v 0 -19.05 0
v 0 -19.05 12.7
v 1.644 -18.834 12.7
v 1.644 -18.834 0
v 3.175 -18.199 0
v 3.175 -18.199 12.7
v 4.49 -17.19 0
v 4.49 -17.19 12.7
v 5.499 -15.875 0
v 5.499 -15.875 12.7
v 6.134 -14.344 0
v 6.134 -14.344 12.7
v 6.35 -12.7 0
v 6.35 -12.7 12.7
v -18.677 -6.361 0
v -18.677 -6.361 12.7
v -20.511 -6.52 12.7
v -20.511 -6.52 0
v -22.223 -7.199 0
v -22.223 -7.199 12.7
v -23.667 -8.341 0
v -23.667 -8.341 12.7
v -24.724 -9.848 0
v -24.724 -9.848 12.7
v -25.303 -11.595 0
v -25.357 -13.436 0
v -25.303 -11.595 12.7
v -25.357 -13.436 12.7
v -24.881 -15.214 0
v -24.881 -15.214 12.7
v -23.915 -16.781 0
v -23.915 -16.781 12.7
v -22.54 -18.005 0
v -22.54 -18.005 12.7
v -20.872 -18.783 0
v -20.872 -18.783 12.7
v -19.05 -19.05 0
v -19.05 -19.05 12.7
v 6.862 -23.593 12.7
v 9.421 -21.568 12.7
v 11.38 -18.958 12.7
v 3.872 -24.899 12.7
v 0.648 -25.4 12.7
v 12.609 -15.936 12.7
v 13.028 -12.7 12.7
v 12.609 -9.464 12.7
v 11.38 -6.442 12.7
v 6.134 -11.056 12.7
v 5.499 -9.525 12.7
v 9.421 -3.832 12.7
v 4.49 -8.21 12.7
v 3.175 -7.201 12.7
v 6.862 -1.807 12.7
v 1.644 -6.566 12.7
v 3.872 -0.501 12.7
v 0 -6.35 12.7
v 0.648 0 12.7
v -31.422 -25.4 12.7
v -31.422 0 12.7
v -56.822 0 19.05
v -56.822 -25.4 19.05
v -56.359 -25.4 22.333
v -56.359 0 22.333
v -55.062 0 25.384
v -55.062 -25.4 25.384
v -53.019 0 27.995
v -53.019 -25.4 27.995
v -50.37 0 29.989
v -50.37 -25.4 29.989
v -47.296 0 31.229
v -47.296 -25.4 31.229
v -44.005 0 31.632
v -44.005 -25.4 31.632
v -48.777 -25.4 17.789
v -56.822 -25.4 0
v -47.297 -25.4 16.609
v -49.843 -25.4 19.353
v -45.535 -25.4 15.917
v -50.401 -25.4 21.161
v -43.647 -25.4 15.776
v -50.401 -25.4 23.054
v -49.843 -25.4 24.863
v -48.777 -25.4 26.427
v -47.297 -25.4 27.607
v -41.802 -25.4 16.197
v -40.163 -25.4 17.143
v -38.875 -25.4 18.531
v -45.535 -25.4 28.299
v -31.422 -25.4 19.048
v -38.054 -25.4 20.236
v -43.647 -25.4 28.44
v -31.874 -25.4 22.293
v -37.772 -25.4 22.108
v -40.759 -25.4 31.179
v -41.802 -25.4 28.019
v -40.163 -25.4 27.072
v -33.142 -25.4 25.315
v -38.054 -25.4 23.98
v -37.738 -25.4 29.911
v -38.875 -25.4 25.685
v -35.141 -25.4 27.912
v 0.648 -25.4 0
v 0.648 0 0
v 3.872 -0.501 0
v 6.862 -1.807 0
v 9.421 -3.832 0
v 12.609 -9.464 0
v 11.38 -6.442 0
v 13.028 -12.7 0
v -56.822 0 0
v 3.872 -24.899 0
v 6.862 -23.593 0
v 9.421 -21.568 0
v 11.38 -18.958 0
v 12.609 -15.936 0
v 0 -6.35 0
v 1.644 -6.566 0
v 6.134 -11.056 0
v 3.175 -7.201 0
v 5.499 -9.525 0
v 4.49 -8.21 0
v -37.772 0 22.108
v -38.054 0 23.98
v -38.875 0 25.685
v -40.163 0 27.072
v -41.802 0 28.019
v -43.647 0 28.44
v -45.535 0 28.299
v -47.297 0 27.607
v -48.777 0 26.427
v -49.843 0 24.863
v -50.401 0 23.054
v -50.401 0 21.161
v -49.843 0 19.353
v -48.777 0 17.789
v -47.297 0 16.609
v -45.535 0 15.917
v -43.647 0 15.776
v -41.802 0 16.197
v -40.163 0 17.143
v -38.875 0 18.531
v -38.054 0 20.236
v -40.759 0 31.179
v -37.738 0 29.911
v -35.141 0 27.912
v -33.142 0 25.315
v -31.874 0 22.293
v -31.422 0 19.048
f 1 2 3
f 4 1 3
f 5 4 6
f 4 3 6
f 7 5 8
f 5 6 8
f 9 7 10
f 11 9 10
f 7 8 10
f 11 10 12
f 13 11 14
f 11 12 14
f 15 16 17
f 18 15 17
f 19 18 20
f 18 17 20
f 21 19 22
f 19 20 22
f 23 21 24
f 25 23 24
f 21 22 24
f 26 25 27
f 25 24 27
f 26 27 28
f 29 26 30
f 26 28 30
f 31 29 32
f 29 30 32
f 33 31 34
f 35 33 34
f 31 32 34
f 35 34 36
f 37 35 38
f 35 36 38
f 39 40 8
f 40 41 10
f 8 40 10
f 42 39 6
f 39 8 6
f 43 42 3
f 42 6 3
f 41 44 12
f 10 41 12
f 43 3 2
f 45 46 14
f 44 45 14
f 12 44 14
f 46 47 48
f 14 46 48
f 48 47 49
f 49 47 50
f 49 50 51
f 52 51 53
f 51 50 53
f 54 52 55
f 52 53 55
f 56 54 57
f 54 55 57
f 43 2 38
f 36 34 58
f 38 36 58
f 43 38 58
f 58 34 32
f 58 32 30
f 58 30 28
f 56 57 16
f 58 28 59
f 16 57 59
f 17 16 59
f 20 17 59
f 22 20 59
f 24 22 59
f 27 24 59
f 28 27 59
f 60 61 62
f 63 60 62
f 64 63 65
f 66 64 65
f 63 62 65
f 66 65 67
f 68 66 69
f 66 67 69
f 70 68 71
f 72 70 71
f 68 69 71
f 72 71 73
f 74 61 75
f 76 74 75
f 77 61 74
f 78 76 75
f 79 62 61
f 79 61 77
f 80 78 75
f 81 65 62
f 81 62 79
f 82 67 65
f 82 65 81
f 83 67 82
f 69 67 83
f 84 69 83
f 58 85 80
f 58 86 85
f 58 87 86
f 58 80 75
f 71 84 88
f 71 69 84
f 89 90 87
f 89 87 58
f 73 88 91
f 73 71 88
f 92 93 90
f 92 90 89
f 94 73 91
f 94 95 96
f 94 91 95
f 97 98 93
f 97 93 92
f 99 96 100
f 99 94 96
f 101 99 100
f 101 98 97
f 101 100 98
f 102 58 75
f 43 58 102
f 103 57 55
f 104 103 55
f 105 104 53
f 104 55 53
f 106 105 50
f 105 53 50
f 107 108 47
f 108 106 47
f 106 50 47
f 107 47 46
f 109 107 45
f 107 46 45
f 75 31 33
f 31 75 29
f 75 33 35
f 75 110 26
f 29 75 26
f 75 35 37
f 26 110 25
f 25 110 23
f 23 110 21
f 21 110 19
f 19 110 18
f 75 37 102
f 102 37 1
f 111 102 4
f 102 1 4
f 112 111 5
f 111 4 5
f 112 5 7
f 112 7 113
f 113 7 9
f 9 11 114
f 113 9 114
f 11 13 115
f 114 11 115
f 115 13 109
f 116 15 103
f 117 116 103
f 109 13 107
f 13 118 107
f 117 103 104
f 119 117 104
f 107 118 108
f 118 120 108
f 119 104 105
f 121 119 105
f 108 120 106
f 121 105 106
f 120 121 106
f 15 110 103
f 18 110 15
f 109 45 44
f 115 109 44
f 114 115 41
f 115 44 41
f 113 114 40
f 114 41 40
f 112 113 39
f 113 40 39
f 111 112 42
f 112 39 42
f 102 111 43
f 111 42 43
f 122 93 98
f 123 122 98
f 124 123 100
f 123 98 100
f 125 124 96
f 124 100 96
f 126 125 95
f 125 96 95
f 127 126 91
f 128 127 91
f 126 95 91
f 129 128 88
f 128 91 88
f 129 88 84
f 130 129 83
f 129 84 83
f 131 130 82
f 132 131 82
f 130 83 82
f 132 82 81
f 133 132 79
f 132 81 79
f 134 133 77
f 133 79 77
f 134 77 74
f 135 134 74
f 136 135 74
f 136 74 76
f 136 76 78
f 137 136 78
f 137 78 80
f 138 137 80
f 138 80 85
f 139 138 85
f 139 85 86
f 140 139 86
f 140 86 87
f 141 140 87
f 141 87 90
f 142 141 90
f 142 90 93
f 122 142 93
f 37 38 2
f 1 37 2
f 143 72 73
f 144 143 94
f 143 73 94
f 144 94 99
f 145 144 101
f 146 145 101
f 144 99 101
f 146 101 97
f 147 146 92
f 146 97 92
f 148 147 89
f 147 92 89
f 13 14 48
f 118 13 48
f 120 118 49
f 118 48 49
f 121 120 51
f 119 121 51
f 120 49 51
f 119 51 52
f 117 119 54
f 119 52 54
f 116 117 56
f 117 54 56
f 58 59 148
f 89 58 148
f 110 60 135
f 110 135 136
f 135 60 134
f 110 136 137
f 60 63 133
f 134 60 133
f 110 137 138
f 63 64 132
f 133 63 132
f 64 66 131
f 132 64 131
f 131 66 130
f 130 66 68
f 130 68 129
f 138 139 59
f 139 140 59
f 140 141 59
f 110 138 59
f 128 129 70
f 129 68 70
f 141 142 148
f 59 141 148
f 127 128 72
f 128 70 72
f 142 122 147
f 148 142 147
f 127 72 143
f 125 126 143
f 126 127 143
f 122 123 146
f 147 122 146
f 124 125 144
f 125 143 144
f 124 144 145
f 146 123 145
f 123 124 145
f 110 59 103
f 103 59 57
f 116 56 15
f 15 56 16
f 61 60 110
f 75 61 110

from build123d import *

# Parameters (mm, degrees)
F1_DEPTH = 25.4
F2_R     = 6.35
F3_DEPTH = 25.401
F5_DEPTH = 25.4
F7_DEPTH = 12.701
F9_DEPTH = 12.701


# Not quite as in the source:
# - ends of sketch curves that miss each other by under 0.0002 mm in the source are joined


with BuildPart() as f1:
    # F0 (on Front) → F1 (new body)
    with BuildSketch(Plane.XZ):
        Polygon((-31.4219513942, 31.5156808858), (-56.8219513942, 31.75), (-56.8219513942, 0), (13.0280486058, 0), (13.0280486058, 12.7), (-31.4219513942, 12.7), align=None)
    extrude(amount=F1_DEPTH)

    # F2 (on face) → F3 (cut, through all)
    with BuildSketch(Plane.XZ.offset(25.4)):
        with Locations((-44.1219513942, 22.1078404429)):
            Circle(F2_R)
    extrude(amount=-F3_DEPTH, mode=Mode.SUBTRACT)

    # F4 (on face) → F5 (cut)
    with BuildSketch(Plane.XZ.offset(25.4)):
        with BuildLine():
            ThreePointArc((-56.8219513942, 19.05), (-53.0189875224, 27.9952387553), (-44.0048017085, 31.6317597181))
            Line((-44.0048017085, 31.6317597181), (-56.8219513942, 31.75))
            Line((-56.8219513942, 31.75), (-56.8219513942, 19.05))
        make_face()
        with BuildLine():
            ThreePointArc((-44.0048017085, 31.6317597181), (-35.1409409401, 27.9120157755), (-31.4219513942, 19.0478384602))
            Line((-31.4219513942, 19.0478384602), (-31.4219513942, 31.5156808858))
            Line((-31.4219513942, 31.5156808858), (-44.0048017085, 31.6317597181))
        make_face()
    extrude(amount=-F5_DEPTH, mode=Mode.SUBTRACT)

    # F6 (on face) → F7 (cut, through all)
    with BuildSketch(Plane.XY.offset(12.7)):
        with BuildLine():
            ThreePointArc((-19.05, -19.05), (-14.5598719395, -17.1901280605), (-12.7, -12.7))
            ThreePointArc((-12.7, -12.7), (-14.4299815751, -8.3436334229), (-18.6773007098, -6.3609468184))
            ThreePointArc((-18.6773007098, -6.3609468184), (-25.3972627054, -12.5135699905), (-19.05, -19.05))
        make_face()
        with BuildLine():
            ThreePointArc((-18.6773007098, -6.3609468184), (-14.4299815751, -8.3436334229), (-12.7, -12.7))
            ThreePointArc((-12.7, -12.7), (-14.5598719395, -17.1901280605), (-19.05, -19.05))
            Line((-19.05, -19.05), (0, -19.05))
            ThreePointArc((0, -19.05), (4.4901280605, -17.1901280605), (6.35, -12.7))
            ThreePointArc((6.35, -12.7), (4.4901280605, -8.2098719395), (0, -6.35))
            Line((0, -6.35), (-18.6773007098, -6.3609468184))
        make_face()
    extrude(amount=-F7_DEPTH, mode=Mode.SUBTRACT)

    # F8 (on face) → F9 (cut, through all)
    with BuildSketch(Plane.XY.offset(12.7)):
        with BuildLine():
            ThreePointArc((0.6478368888, 0), (9.420896658, -3.8320853331), (13.0280486058, -12.7))
            Line((13.0280486058, -12.7), (13.0280486058, 0))
            Line((13.0280486058, 0), (0.6478368888, 0))
        make_face()
        with BuildLine():
            ThreePointArc((13.0280486058, -12.7), (9.420896658, -21.5679146669), (0.6478368888, -25.4))
            Line((0.6478368888, -25.4), (13.0280486058, -25.4))
            Line((13.0280486058, -25.4), (13.0280486058, -12.7))
        make_face()
    extrude(amount=-F9_DEPTH, mode=Mode.SUBTRACT)


solid = f1.part
